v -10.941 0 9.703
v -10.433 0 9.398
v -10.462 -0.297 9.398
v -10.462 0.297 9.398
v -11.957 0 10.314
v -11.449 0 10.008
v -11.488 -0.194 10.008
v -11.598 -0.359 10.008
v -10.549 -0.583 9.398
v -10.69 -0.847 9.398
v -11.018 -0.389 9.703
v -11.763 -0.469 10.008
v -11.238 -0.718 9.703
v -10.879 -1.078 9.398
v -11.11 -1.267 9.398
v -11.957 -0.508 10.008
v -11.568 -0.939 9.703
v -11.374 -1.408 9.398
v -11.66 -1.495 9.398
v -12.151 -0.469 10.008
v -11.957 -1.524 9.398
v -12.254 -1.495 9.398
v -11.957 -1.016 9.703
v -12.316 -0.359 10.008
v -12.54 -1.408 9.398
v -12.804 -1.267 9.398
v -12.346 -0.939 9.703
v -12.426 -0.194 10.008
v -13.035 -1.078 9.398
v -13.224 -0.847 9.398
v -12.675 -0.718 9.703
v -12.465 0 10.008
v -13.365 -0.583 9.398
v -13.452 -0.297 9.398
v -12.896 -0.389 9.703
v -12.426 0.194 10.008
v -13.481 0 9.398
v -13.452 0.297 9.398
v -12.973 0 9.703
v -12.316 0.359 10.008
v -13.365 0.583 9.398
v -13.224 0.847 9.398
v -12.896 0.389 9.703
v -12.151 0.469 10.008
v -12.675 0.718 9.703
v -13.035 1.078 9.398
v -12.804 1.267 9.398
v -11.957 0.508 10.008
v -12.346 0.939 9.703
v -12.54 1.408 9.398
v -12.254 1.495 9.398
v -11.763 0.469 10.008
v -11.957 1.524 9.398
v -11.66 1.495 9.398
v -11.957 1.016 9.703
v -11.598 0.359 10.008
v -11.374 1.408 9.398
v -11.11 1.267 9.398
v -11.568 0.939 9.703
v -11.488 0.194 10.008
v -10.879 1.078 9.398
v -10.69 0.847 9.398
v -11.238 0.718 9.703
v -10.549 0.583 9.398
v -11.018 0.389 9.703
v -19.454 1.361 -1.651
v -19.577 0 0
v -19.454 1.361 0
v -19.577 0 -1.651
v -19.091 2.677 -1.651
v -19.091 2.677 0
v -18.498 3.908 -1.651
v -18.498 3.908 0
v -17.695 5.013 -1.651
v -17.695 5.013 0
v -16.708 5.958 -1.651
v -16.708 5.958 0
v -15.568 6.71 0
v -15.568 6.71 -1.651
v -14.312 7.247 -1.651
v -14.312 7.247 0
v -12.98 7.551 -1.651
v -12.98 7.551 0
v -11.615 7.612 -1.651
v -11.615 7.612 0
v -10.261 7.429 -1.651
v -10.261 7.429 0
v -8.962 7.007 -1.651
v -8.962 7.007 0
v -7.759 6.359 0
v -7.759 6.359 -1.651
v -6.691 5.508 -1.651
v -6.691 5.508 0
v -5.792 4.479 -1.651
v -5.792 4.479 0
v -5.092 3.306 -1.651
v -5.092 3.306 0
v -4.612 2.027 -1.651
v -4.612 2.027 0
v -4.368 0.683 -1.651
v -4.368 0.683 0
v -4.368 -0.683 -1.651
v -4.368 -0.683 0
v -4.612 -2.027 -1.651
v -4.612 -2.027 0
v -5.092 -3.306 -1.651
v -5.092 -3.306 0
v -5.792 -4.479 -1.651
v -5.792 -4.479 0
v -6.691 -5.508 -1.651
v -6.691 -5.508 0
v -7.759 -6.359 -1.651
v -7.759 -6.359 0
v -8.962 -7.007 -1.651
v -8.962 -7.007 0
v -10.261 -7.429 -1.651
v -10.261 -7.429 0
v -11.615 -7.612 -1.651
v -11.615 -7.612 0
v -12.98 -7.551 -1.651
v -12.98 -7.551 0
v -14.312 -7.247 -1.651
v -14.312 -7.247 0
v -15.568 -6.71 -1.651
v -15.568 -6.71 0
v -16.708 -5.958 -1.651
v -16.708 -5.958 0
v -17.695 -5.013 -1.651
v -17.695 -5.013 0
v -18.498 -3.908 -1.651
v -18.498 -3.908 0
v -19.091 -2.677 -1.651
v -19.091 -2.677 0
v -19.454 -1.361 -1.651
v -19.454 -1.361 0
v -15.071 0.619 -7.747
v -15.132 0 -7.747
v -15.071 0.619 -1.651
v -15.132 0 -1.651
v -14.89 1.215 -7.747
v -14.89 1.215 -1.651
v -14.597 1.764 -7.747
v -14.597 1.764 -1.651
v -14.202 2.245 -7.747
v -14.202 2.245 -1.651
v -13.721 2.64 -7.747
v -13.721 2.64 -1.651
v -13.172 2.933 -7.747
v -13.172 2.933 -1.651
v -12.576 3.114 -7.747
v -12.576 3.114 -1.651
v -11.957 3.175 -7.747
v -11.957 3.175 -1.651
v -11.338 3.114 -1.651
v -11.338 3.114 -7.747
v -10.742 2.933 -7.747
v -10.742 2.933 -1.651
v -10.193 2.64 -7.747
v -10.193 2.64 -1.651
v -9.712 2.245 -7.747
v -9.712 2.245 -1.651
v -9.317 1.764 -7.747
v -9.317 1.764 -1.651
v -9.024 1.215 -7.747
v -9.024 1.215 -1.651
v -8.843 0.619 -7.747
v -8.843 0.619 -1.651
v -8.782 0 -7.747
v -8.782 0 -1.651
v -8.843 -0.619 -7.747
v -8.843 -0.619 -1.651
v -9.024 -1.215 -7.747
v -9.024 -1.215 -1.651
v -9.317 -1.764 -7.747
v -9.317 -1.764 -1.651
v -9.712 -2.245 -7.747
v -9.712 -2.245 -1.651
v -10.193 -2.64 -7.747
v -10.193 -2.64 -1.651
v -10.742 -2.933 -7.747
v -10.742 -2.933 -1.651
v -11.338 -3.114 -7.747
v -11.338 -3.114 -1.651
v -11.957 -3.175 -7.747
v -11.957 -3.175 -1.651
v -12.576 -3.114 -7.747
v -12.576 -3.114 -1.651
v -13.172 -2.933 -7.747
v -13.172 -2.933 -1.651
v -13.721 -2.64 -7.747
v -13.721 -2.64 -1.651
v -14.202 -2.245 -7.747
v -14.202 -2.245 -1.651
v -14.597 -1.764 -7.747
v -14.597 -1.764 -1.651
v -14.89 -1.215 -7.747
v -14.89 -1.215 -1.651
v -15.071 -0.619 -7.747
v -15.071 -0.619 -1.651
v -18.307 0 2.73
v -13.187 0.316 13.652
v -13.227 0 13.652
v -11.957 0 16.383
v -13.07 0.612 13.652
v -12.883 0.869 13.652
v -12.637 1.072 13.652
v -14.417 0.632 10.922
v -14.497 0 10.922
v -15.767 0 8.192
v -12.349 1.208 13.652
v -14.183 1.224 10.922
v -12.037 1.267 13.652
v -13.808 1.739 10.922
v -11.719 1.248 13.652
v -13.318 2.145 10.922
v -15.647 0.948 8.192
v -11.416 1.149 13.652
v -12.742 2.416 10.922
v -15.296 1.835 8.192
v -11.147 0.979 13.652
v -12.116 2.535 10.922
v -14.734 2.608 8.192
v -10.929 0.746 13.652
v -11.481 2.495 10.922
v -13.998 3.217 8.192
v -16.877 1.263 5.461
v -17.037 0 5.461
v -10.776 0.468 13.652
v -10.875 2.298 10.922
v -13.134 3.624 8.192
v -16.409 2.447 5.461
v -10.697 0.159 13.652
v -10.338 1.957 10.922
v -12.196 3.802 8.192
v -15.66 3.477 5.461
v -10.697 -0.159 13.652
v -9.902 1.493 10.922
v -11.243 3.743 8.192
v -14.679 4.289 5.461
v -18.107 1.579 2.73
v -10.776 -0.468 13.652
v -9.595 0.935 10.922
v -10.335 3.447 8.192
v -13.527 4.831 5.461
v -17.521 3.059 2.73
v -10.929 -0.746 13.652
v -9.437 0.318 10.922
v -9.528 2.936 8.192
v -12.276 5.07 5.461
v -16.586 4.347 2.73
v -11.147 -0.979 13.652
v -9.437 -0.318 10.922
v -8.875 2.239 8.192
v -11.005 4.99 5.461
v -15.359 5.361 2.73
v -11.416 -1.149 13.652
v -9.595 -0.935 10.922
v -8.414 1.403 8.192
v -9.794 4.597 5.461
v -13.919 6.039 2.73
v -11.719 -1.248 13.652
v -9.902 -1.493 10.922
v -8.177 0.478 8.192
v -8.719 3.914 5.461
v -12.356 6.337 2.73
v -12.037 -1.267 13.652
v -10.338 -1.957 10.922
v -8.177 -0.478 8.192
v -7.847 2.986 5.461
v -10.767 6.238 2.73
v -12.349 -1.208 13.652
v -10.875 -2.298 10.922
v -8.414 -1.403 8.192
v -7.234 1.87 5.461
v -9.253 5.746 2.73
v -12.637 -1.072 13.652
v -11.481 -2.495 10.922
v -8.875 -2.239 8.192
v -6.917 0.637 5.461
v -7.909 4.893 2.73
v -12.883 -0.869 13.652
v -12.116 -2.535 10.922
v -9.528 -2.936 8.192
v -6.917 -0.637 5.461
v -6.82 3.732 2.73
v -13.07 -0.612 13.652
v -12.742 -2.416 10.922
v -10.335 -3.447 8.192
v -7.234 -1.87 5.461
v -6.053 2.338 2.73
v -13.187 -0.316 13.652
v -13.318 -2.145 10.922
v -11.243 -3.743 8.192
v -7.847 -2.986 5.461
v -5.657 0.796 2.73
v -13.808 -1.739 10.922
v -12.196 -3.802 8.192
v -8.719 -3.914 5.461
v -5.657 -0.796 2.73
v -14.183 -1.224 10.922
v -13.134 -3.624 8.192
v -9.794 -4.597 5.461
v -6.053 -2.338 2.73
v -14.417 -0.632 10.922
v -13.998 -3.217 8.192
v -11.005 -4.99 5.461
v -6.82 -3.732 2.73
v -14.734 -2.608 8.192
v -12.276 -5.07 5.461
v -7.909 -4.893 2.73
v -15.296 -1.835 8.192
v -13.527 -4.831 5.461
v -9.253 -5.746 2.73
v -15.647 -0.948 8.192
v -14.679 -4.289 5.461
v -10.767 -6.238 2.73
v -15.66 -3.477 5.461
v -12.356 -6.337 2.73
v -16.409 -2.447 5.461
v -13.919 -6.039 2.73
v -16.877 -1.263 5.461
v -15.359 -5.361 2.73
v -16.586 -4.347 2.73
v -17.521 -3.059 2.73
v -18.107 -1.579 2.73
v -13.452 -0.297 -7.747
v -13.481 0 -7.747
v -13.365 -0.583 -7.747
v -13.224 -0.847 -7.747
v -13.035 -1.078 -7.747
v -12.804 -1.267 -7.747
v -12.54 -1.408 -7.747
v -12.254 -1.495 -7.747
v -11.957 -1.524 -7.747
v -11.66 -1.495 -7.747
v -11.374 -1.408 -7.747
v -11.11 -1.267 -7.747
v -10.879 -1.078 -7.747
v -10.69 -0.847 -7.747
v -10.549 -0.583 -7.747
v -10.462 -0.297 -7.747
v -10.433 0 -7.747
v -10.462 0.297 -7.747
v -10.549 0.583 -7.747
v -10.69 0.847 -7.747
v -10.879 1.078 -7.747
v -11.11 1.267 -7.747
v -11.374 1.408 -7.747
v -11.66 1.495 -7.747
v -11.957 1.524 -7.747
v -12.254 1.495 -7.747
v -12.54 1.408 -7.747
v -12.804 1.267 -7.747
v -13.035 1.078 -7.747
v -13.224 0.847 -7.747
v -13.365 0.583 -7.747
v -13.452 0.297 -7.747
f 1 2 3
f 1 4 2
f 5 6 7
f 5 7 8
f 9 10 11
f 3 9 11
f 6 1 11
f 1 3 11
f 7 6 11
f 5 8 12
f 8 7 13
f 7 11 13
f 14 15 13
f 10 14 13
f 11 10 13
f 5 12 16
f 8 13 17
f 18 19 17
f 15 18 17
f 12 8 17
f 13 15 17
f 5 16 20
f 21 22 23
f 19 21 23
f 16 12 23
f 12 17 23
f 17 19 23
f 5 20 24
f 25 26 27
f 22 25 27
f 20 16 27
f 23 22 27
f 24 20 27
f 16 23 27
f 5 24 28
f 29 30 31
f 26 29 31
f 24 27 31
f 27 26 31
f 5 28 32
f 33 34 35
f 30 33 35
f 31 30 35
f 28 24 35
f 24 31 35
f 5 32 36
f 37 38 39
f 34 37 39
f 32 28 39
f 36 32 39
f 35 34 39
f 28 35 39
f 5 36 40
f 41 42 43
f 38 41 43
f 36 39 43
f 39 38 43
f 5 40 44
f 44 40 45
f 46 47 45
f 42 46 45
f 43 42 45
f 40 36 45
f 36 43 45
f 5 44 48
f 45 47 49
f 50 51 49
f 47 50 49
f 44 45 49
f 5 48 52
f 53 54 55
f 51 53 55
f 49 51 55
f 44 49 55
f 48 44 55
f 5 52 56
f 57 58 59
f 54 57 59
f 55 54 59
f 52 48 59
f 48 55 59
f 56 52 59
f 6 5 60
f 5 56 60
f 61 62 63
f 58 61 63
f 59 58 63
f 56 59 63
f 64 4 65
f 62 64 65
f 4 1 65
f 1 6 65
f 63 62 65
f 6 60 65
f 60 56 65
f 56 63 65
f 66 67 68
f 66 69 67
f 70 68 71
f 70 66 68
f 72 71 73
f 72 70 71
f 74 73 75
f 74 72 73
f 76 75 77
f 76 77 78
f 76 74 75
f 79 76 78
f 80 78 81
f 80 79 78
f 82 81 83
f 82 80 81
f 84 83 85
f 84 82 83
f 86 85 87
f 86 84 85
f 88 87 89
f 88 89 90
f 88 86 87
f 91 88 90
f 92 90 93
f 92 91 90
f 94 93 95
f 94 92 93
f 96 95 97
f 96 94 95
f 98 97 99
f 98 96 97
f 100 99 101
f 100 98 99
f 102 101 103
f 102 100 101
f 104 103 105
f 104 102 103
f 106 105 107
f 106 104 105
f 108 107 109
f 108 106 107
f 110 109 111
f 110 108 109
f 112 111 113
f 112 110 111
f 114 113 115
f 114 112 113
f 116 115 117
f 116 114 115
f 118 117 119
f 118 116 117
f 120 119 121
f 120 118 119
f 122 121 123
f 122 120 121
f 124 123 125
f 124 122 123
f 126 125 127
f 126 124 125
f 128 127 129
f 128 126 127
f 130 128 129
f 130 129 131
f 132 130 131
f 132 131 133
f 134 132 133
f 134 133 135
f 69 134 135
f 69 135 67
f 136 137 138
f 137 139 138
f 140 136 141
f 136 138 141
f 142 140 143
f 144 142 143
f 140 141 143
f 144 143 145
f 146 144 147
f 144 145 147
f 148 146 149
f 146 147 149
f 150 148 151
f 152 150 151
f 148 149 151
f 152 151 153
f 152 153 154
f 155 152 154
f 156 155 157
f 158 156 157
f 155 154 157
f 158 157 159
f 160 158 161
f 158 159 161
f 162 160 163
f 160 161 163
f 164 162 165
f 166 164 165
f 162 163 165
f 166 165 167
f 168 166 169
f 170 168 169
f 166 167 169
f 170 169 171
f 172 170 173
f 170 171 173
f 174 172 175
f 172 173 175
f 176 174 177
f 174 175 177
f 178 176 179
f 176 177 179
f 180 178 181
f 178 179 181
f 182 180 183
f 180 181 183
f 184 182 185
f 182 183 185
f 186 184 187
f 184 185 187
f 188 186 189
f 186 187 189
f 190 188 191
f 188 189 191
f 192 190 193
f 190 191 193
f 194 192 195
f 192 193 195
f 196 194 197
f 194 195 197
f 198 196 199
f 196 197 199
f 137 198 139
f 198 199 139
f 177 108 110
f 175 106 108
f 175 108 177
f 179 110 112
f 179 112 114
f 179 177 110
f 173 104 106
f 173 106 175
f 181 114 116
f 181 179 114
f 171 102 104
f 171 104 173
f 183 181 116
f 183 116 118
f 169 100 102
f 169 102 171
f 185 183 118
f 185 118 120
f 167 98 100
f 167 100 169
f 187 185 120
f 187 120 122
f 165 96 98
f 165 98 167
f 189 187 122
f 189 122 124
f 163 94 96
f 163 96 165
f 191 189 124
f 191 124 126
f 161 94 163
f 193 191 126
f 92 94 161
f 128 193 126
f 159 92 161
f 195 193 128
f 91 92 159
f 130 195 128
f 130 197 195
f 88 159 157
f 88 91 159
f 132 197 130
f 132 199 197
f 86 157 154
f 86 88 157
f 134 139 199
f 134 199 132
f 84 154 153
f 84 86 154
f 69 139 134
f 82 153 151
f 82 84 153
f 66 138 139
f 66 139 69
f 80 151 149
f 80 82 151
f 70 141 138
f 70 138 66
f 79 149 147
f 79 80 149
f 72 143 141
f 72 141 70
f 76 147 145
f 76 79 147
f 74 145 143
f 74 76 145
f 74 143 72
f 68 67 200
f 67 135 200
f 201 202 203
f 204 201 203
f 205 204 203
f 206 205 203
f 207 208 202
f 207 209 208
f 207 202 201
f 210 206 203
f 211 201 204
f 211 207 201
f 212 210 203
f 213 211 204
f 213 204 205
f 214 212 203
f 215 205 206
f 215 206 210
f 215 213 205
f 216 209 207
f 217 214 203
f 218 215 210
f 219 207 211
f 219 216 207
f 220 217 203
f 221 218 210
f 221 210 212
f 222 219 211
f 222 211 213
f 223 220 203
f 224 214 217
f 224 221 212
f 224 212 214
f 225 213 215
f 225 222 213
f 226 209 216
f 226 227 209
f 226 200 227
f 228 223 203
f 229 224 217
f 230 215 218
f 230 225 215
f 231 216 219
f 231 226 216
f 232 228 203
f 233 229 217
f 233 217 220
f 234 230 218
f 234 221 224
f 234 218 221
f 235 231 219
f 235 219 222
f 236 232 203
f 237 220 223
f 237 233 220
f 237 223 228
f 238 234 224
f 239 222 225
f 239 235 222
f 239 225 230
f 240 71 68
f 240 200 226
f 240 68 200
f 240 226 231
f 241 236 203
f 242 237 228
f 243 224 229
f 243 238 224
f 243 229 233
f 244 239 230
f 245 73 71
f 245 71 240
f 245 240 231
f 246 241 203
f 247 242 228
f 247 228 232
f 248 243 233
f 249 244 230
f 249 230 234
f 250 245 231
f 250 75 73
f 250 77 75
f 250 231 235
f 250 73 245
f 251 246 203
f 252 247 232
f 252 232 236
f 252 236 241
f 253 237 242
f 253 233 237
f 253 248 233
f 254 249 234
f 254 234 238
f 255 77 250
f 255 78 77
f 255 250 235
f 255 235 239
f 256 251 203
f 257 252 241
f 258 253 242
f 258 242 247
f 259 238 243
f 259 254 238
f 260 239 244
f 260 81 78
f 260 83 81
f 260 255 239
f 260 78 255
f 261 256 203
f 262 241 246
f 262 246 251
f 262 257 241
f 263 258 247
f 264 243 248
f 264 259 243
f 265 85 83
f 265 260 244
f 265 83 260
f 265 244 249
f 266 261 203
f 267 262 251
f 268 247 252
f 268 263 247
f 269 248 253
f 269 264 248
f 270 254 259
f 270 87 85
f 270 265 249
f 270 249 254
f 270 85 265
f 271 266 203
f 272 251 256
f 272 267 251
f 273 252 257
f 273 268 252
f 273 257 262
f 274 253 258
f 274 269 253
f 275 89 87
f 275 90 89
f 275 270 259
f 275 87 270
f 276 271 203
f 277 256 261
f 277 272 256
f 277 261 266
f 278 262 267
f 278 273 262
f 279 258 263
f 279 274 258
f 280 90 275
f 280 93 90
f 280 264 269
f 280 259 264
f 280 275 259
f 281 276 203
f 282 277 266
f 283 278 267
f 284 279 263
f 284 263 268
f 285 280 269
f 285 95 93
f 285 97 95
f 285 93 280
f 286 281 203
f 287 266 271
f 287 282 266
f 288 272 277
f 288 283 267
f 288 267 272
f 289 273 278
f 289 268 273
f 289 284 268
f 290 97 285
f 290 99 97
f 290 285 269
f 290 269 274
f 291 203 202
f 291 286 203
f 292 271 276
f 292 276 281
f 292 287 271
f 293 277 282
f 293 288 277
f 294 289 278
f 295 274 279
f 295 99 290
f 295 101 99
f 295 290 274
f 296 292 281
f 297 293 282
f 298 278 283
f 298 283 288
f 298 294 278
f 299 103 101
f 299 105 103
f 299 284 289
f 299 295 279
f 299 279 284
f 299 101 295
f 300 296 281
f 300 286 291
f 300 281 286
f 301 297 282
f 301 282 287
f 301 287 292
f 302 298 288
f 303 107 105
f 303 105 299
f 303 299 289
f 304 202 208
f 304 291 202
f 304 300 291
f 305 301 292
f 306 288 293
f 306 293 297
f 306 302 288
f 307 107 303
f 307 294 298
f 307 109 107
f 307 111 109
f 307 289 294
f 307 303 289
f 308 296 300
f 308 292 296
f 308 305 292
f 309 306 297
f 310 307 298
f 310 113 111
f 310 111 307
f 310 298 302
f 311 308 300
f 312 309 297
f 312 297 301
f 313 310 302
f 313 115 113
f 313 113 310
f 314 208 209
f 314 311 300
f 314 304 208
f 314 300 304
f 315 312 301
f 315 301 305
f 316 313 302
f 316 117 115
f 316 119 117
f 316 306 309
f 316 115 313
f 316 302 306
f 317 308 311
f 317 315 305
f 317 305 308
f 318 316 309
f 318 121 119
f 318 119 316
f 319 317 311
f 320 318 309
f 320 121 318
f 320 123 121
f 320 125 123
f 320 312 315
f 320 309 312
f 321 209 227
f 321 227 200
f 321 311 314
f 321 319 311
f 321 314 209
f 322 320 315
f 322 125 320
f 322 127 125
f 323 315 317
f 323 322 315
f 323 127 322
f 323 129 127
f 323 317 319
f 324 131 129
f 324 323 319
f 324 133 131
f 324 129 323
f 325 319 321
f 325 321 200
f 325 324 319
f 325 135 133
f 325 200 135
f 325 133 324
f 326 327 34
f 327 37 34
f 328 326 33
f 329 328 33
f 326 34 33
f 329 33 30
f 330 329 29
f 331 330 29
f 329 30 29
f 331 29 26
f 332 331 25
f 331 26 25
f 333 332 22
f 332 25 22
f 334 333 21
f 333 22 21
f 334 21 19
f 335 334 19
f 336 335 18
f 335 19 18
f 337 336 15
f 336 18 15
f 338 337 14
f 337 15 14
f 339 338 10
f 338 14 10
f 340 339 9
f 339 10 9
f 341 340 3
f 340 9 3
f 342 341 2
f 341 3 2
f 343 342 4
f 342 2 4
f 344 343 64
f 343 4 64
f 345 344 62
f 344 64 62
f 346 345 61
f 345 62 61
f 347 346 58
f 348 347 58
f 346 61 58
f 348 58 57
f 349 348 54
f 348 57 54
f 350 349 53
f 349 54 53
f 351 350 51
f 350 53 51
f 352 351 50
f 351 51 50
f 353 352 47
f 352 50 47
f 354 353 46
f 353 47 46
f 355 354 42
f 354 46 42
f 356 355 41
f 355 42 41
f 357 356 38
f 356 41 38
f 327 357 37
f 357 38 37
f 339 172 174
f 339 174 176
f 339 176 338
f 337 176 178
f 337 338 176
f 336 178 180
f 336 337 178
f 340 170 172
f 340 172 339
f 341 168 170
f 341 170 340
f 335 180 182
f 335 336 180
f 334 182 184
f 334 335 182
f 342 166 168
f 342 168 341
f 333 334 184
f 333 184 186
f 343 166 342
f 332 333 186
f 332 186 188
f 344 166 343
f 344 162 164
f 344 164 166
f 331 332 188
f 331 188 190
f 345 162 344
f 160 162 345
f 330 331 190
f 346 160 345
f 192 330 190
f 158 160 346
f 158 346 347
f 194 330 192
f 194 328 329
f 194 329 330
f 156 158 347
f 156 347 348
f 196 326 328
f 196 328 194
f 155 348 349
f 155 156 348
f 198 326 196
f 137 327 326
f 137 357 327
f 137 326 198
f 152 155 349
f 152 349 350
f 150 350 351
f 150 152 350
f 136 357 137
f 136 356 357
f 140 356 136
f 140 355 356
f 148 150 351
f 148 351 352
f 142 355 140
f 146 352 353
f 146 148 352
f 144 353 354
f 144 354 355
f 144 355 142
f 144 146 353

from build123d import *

# Parameters (mm, degrees)
F0_W     = 3.175
F0_H     = 6.096
F3_D     = 3.048
F3_DEPTH = 17.145
F3_TIP   = 0.9157115834


with BuildPart() as f1:
    # F0 (on Front) → F1 (revolve)
    with BuildSketch(Plane.XZ):
        Polygon((-11.9569151578, -1.651), (-11.9569151578, 16.383), (-19.5769151578, 0), (-19.5769151578, -1.651), (-15.1319151578, -1.651), align=None)
        with Locations((-13.5444151578, -4.699)):
            Rectangle(F0_W, F0_H)
    revolve(axis=Axis((-11.9569151578, 0, 7.366), (0, 0, -1)))

    # F3
    with Locations(Plane(origin=(0, 0, -7.747), x_dir=(1, 0, 0), z_dir=(0, 0, -1))):
        with Locations((-11.9569151578, 0)):
            Hole(F3_D / 2, depth=F3_DEPTH)
            with Locations((0, 0, -(F3_DEPTH + F3_TIP / 2))):  # 118° drill point
                Cone(0, F3_D / 2, F3_TIP, mode=Mode.SUBTRACT)


solid = f1.part
